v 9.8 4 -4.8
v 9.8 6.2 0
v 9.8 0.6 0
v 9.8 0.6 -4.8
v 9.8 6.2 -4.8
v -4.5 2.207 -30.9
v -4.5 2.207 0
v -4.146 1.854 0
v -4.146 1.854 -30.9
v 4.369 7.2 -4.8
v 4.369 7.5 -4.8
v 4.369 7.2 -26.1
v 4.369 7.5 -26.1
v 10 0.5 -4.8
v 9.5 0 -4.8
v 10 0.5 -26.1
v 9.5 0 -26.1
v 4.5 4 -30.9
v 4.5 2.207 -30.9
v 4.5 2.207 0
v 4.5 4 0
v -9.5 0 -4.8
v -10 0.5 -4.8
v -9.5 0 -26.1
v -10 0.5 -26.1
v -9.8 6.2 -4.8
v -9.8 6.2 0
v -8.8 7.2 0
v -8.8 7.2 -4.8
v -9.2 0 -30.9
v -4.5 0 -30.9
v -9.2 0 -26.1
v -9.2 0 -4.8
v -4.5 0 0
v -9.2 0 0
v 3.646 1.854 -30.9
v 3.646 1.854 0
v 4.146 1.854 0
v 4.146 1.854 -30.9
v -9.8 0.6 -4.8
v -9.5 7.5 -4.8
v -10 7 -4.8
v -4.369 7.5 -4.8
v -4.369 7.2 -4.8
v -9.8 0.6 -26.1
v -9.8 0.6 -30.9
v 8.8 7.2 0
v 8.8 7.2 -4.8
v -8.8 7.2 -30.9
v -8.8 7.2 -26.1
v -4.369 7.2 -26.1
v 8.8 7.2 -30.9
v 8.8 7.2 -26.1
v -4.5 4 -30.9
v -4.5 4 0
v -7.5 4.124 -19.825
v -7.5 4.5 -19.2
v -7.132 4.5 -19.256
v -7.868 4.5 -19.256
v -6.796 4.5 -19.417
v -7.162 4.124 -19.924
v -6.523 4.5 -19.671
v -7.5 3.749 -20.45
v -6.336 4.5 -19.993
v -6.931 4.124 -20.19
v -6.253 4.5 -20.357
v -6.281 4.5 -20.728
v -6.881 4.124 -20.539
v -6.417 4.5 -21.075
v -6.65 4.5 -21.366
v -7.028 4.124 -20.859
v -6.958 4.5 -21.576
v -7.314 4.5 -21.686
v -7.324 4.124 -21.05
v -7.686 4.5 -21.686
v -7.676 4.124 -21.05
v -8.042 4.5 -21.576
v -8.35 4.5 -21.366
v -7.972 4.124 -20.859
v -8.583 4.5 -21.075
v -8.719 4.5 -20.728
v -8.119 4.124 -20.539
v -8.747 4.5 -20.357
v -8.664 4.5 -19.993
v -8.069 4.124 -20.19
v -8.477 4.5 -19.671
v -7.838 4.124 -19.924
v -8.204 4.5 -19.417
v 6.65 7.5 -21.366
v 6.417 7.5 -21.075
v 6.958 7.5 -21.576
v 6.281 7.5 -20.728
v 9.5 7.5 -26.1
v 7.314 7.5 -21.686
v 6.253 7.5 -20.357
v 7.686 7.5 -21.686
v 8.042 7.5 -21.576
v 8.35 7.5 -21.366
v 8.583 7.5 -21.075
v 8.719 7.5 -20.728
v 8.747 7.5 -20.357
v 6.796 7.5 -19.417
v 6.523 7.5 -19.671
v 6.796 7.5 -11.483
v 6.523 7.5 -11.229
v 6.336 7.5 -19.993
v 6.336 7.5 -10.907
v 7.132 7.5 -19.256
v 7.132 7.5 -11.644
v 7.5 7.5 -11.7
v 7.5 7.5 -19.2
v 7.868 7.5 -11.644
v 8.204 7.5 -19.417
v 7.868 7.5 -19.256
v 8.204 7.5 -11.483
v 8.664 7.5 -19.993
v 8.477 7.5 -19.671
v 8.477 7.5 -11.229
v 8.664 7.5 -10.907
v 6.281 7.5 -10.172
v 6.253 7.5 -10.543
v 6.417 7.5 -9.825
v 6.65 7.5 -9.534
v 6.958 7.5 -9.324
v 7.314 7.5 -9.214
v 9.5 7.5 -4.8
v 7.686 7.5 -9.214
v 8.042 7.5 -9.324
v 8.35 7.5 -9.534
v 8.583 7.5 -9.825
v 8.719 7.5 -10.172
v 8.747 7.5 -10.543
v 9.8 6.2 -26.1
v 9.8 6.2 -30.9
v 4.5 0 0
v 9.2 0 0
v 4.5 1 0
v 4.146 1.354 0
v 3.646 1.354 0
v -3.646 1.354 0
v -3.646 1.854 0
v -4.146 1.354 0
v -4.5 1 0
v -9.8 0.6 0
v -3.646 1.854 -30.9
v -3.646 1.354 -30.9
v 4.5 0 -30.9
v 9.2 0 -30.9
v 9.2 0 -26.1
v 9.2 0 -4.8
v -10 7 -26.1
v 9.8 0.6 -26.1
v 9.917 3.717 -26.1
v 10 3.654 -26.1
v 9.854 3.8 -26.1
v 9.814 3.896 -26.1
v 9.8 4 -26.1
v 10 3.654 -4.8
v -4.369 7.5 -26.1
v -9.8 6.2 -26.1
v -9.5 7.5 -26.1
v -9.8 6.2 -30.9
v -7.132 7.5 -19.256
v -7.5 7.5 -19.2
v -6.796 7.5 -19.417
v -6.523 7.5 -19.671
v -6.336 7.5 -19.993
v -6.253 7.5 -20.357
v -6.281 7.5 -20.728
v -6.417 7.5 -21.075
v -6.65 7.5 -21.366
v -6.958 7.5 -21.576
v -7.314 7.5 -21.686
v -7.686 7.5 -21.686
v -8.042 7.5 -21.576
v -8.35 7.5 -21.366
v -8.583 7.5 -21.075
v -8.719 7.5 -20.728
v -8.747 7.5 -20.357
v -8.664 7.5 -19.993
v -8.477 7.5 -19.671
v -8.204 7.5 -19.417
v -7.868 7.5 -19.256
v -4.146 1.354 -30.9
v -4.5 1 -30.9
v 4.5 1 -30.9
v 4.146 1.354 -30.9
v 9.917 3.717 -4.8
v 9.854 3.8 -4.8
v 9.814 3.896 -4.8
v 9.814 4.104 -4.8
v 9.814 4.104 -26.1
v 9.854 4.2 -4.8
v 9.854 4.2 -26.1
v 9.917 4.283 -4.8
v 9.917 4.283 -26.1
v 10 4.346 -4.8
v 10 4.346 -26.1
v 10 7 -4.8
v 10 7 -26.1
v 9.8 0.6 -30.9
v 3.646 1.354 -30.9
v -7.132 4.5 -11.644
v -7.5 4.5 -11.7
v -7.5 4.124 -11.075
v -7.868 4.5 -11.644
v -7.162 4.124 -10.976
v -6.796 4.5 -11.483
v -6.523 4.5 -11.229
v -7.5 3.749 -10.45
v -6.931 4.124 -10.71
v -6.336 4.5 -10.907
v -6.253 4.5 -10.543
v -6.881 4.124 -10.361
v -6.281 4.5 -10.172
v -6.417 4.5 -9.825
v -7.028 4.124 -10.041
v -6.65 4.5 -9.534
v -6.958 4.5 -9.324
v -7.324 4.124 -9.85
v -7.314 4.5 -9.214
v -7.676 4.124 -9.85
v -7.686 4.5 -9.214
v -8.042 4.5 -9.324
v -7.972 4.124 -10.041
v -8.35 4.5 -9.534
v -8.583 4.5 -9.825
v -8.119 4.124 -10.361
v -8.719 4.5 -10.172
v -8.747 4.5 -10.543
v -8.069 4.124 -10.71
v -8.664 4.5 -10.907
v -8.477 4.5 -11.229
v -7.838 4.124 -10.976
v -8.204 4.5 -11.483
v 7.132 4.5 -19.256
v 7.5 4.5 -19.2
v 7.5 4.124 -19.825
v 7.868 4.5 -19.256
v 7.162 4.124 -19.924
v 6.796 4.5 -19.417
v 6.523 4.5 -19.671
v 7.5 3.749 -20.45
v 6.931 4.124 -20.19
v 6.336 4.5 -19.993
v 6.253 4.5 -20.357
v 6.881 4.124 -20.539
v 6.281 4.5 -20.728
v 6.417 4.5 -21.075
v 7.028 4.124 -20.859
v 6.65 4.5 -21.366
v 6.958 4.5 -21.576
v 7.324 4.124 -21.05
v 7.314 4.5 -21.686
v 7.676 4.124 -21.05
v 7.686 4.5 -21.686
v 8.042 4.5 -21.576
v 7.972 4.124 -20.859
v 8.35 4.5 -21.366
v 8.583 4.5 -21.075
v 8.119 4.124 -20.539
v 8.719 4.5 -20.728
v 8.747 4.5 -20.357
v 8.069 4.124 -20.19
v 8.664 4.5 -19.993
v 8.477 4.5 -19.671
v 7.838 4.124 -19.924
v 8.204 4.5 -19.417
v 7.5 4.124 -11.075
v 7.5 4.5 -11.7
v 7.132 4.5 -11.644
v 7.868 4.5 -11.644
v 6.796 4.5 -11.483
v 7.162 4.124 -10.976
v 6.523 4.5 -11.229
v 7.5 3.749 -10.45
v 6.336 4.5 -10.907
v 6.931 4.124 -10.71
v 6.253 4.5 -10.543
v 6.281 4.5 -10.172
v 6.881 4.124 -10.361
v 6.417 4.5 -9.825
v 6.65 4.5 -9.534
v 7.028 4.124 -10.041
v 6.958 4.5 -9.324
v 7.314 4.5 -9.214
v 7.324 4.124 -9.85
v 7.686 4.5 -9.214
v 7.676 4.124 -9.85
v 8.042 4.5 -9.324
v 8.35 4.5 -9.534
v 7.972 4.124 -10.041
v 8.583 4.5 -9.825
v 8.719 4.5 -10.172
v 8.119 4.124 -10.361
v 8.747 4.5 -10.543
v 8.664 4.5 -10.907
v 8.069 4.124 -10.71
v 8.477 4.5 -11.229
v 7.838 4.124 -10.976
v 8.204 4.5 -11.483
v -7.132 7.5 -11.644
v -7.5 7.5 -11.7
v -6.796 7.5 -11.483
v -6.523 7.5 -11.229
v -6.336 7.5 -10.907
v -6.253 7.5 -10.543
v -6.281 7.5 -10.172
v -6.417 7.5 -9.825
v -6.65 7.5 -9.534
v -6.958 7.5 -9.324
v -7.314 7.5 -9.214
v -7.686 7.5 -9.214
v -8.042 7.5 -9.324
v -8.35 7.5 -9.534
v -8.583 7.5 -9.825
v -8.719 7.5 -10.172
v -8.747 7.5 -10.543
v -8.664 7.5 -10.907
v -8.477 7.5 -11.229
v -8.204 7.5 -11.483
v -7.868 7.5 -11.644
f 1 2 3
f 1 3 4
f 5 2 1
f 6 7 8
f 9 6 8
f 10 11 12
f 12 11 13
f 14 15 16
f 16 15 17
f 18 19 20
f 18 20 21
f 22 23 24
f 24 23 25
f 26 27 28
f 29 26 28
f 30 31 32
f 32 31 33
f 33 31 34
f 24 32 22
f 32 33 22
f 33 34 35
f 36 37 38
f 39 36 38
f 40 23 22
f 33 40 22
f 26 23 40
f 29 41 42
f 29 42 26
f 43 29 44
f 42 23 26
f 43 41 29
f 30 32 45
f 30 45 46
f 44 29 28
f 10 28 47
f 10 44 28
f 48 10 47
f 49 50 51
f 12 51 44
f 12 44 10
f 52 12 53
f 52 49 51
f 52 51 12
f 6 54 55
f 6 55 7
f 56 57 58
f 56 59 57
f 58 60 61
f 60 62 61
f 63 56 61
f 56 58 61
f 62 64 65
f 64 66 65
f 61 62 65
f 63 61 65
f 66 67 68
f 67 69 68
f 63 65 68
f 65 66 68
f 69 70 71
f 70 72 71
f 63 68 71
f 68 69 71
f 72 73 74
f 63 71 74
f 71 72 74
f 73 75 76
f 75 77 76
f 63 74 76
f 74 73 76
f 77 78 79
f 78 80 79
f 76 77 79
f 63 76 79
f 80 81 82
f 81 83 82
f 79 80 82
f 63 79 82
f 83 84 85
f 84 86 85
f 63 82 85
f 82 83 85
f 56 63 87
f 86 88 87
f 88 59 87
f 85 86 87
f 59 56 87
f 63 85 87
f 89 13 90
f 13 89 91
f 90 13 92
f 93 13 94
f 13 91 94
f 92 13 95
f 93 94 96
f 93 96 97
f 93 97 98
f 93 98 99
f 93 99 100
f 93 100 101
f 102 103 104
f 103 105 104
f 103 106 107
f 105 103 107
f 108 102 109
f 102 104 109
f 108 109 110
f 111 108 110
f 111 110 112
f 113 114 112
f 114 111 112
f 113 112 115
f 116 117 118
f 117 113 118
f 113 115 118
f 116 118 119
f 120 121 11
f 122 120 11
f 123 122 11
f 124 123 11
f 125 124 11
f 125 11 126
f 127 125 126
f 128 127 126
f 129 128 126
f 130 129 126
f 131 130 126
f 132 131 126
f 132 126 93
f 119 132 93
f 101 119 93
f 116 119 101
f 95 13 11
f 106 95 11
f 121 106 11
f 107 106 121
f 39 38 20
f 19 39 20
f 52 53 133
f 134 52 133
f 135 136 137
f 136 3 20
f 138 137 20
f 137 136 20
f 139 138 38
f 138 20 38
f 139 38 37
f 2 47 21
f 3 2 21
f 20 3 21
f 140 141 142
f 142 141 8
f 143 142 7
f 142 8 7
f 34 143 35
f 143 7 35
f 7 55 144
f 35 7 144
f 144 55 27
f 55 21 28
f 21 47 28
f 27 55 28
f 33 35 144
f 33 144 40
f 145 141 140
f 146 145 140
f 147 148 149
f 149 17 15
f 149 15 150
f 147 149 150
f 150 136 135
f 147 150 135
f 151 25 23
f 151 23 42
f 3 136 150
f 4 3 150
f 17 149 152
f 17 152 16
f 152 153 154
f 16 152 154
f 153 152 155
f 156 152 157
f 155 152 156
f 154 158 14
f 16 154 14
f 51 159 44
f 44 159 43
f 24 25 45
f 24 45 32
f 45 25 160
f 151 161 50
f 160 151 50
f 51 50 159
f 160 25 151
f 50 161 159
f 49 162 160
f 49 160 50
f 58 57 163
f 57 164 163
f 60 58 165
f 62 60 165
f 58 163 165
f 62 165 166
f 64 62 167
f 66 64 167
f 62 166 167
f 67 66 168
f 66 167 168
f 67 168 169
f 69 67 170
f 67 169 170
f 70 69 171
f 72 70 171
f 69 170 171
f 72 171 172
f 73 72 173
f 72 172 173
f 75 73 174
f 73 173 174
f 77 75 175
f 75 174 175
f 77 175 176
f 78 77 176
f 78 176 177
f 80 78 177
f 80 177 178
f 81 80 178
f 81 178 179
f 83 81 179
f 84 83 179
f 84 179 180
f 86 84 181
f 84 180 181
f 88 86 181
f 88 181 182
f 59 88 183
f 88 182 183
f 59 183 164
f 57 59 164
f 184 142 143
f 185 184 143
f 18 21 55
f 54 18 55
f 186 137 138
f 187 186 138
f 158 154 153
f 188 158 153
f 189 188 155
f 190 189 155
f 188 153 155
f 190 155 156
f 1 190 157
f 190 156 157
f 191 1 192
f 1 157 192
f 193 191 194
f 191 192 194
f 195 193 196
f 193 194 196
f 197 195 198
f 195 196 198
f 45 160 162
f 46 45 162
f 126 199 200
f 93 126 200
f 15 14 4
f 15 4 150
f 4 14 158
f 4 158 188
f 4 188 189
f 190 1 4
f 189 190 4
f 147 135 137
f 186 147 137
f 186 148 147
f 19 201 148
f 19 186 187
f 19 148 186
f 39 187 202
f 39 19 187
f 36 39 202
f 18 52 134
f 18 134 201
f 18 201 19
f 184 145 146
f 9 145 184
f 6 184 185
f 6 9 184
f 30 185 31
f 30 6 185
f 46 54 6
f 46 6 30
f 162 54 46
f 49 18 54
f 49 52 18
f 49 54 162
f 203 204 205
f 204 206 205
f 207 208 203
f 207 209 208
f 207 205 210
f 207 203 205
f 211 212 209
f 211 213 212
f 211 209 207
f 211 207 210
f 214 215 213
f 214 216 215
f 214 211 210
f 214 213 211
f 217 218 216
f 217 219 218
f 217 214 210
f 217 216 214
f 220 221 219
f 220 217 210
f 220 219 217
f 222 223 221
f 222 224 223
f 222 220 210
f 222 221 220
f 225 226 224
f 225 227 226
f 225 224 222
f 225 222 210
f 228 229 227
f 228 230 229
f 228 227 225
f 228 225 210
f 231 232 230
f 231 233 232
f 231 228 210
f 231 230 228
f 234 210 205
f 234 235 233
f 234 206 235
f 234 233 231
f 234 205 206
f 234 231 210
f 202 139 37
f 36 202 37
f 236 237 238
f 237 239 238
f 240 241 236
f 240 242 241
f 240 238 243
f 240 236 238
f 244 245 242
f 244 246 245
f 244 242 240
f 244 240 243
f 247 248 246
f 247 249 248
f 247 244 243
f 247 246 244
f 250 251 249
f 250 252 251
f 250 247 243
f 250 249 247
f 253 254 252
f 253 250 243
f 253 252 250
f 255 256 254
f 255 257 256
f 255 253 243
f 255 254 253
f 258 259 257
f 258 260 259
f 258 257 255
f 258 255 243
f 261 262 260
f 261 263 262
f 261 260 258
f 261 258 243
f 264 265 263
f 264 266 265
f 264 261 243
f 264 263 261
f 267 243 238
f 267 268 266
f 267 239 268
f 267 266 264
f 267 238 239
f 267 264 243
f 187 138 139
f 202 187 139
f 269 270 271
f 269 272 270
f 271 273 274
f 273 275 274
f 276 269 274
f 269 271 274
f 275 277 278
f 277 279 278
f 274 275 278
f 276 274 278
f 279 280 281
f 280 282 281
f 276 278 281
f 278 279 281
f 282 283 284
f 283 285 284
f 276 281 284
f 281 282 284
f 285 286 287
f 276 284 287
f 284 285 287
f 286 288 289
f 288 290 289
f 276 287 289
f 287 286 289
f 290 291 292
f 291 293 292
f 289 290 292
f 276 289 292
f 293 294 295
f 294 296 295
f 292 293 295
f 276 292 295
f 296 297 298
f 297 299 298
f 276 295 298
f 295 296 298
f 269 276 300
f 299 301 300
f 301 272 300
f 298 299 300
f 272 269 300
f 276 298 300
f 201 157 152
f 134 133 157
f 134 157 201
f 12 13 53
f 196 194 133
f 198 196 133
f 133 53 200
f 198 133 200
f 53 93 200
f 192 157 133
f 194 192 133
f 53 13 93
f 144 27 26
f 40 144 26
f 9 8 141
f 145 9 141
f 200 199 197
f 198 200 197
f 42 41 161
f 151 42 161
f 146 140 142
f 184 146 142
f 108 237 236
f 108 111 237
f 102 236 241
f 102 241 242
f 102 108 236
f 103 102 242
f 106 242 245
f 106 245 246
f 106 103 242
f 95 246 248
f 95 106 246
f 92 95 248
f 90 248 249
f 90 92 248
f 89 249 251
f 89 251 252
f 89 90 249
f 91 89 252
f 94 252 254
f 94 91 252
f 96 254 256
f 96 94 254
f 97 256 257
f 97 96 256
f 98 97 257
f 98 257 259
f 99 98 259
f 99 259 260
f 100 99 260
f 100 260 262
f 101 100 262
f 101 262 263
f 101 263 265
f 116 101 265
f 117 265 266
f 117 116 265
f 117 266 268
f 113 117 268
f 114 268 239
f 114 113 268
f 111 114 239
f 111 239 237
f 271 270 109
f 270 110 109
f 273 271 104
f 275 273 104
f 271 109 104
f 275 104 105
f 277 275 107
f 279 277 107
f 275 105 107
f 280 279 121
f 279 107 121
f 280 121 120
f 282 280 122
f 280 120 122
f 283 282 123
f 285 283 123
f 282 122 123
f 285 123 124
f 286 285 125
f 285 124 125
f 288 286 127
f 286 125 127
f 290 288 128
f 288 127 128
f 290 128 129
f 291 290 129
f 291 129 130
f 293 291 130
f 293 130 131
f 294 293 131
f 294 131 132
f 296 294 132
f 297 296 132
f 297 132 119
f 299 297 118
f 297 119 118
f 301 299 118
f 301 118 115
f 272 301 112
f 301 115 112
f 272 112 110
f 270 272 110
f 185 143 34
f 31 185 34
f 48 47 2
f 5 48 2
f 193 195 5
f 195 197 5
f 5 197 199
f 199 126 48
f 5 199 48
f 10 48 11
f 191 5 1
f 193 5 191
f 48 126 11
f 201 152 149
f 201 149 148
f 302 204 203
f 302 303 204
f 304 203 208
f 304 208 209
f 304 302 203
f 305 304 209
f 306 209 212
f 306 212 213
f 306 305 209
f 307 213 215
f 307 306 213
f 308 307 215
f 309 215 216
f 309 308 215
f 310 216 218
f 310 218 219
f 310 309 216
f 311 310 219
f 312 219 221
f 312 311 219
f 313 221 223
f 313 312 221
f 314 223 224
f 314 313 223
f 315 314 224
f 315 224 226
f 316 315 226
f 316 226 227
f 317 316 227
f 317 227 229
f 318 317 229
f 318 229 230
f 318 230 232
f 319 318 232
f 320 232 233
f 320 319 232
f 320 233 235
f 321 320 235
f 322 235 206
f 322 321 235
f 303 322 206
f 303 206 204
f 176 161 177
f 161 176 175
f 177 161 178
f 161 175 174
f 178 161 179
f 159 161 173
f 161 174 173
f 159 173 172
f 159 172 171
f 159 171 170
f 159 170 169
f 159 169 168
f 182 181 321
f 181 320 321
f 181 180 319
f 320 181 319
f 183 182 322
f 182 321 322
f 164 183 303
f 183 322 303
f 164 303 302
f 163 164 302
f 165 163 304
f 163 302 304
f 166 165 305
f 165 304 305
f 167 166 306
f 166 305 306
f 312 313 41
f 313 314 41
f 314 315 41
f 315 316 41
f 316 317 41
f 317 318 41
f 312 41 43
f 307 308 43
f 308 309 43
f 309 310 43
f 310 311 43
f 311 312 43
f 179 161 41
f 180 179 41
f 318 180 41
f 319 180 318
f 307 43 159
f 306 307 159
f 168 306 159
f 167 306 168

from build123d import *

# Parameters (mm, degrees)
EXTRUDE_1_DEPTH     = 30.9
CHAMFER_1_SIZE      = 0.5
CUT_EXTRUDE_1_DEPTH = 0.3
SKETCH_6_W          = 0.2
SKETCH_6_H          = 4.8
CUT_EXTRUDE_2_DEPTH = 8.3
CHAMFER_2_SIZE      = 1
CHAMFER_3_SIZE      = 0.6
CHAMFER_4_SIZE      = 0.5
SKETCH_7_R          = 0.4
CUT_EXTRUDE_3_DEPTH = 21.3


with BuildPart() as part:
    # 草图1 → 凸台-拉伸1 (new body)
    with BuildSketch(Plane.XY):
        Polygon((-10, 0), (-10, 7.5), (10, 7.5), (10, 0), (4.5, 0), (4.5, 1), (4.146446609, 1.353553391), (3.646446609, 1.353553391), (3.646446609, 1.853553391), (4.146446609, 1.853553391), (4.5, 2.207106781), (4.5, 4), (-4.5, 4), (-4.5, 2.207106781), (-4.146446609, 1.853553391), (-3.646446609, 1.853553391), (-3.646446609, 1.353553391), (-4.146446609, 1.353553391), (-4.5, 1), (-4.5, 0), align=None)
    extrude(amount=-EXTRUDE_1_DEPTH)

    # 草图3 → M3 螺纹孔1 (revolve, cut)
    with BuildSketch(Plane(origin=(7.5, 7.5, -20.45), x_dir=(0, 0, 1), z_dir=(1, 0, 0))):
        Polygon((0, 0), (0, 3.751075774), (1.25, 3), (1.25, 0), align=None)
    hole_wizard_m3_1 = revolve(axis=Axis((7.5, 13.85, -20.45), (0, -1, 0)), mode=Mode.SUBTRACT)

    # 镜向1: M3 螺纹孔1 across plane
    add(hole_wizard_m3_1.mirror(Plane(origin=(0, 0, -15.45), x_dir=(1, 0, 0), z_dir=(0, 0, -1))), mode=Mode.SUBTRACT)

    # 镜向2: M3 螺纹孔1 across plane
    add(hole_wizard_m3_1.mirror(Plane.ZY), mode=Mode.SUBTRACT)

    # 镜向2 copy 1 sketch → 镜向2 copy 1 (revolve, cut)
    with BuildSketch(Plane(origin=(-7.5, 7.5, -10.45), x_dir=(0, 0, -1), z_dir=(-1, 0, 0))):
        Polygon((0, 0), (0, 3.751075774), (1.25, 3), (1.25, 0), align=None)
    revolve(axis=Axis((-7.5, 13.85, -10.45), (0, -1, 0)), mode=Mode.SUBTRACT)

    # 倒角1
    chamfer_1_edges = [part.edges().sort_by_distance(p)[0] for p in [
        (10, 7.5, -15.45),
        (-10, 7.5, -15.45),
    ]]
    chamfer(chamfer_1_edges, length=CHAMFER_1_SIZE)

    # 草图5 → 切除-拉伸1 (cut)
    with BuildSketch(Plane(origin=(0, 7.5, 0), x_dir=(1, 0, 0), z_dir=(0, 1, 0))):
        Polygon((-9.5, 26.1), (-4.368581018, 26.1), (-4.368581018, 4.8), (-9.5, 4.8), (-10, 4.8), (-10, 0), (10, 0), (10, 4.8), (9.5, 4.8), (4.368581018, 4.8), (4.368581018, 26.1), (9.5, 26.1), (10, 26.1), (10, 30.9), (-10, 30.9), (-10, 26.1), align=None)
    extrude(amount=-CUT_EXTRUDE_1_DEPTH, mode=Mode.SUBTRACT)

    # 草图6 → 切除-拉伸2 (cut)
    with BuildSketch(Plane(origin=(0, 7.2, 0), x_dir=(1, 0, 0), z_dir=(0, 1, 0))):
        with Locations((-9.9, 28.5)):
            Rectangle(SKETCH_6_W, SKETCH_6_H)
        with Locations((9.9, 28.5)):
            Rectangle(SKETCH_6_W, SKETCH_6_H)
        with Locations((9.9, 2.4)):
            Rectangle(SKETCH_6_W, SKETCH_6_H)
        with Locations((-9.9, 2.4)):
            Rectangle(SKETCH_6_W, SKETCH_6_H)
    extrude(amount=-CUT_EXTRUDE_2_DEPTH, mode=Mode.SUBTRACT)

    # 倒角2
    # the kernel refuses this chamfer: 1 mm, written as the material it takes off along each edge
    with BuildSketch(Plane(origin=(-9.8, 7.2, -4.8), x_dir=(-0.027495876610583895, -0.9996219169112968, 0), z_dir=(0, 0, 1)), Plane(origin=(-9.8, 7.2, -33.471682988), x_dir=(-0.027495876610585623, -0.9996219169112968, 0), z_dir=(0, 0, 1))) as chamfer_2_piece_1:
        Polygon((CHAMFER_2_SIZE * 0.999621916911, CHAMFER_2_SIZE * 0.0274958766106), (-CHAMFER_2_SIZE * 0.0274958766106, CHAMFER_2_SIZE * 0.999621916911), (0, 0), align=None)
    extrude(amount=7.371682988, mode=Mode.SUBTRACT)
    with BuildSketch(Plane(origin=(9.8, 7.2, 2.571682988), x_dir=(-0.9996219169112968, 0.02749587661058651, 0), z_dir=(0, 0, -1)), Plane(origin=(9.8, 7.2, -26.1), x_dir=(-0.9996219169112968, 0.02749587661058651, 0), z_dir=(0, 0, -1))) as chamfer_2_piece_2:
        Polygon((CHAMFER_2_SIZE * 0.999621916911, -CHAMFER_2_SIZE * 0.0274958766106), (-CHAMFER_2_SIZE * 0.0274958766106, -CHAMFER_2_SIZE * 0.999621916911), (0, 0), align=None)
    extrude(amount=7.371682988, mode=Mode.SUBTRACT)

    # 倒角3
    chamfer_3_edges = [part.edges().sort_by_distance(p)[0] for p in [
        (-9.8, 0, -28.5),
        (9.8, 0, -28.5),
        (9.8, 0, -2.4),
        (-9.8, 0, -2.4),
    ]]
    chamfer(chamfer_3_edges, length=CHAMFER_3_SIZE)

    # 倒角4
    chamfer_4_edges = [part.edges().sort_by_distance(p)[0] for p in [
        (-10, 0, -15.45),
        (10, 0, -15.45),
    ]]
    chamfer(chamfer_4_edges, length=CHAMFER_4_SIZE)

    # 草图7 → 切除-拉伸3 (cut)
    with BuildSketch(Plane(origin=(0, 0, -26.1), x_dir=(-1, 0, 0), z_dir=(0, 0, -1))):
        with Locations((-10.2, 4)):
            Circle(SKETCH_7_R)
    extrude(amount=-CUT_EXTRUDE_3_DEPTH, mode=Mode.SUBTRACT)


solid = part.part
